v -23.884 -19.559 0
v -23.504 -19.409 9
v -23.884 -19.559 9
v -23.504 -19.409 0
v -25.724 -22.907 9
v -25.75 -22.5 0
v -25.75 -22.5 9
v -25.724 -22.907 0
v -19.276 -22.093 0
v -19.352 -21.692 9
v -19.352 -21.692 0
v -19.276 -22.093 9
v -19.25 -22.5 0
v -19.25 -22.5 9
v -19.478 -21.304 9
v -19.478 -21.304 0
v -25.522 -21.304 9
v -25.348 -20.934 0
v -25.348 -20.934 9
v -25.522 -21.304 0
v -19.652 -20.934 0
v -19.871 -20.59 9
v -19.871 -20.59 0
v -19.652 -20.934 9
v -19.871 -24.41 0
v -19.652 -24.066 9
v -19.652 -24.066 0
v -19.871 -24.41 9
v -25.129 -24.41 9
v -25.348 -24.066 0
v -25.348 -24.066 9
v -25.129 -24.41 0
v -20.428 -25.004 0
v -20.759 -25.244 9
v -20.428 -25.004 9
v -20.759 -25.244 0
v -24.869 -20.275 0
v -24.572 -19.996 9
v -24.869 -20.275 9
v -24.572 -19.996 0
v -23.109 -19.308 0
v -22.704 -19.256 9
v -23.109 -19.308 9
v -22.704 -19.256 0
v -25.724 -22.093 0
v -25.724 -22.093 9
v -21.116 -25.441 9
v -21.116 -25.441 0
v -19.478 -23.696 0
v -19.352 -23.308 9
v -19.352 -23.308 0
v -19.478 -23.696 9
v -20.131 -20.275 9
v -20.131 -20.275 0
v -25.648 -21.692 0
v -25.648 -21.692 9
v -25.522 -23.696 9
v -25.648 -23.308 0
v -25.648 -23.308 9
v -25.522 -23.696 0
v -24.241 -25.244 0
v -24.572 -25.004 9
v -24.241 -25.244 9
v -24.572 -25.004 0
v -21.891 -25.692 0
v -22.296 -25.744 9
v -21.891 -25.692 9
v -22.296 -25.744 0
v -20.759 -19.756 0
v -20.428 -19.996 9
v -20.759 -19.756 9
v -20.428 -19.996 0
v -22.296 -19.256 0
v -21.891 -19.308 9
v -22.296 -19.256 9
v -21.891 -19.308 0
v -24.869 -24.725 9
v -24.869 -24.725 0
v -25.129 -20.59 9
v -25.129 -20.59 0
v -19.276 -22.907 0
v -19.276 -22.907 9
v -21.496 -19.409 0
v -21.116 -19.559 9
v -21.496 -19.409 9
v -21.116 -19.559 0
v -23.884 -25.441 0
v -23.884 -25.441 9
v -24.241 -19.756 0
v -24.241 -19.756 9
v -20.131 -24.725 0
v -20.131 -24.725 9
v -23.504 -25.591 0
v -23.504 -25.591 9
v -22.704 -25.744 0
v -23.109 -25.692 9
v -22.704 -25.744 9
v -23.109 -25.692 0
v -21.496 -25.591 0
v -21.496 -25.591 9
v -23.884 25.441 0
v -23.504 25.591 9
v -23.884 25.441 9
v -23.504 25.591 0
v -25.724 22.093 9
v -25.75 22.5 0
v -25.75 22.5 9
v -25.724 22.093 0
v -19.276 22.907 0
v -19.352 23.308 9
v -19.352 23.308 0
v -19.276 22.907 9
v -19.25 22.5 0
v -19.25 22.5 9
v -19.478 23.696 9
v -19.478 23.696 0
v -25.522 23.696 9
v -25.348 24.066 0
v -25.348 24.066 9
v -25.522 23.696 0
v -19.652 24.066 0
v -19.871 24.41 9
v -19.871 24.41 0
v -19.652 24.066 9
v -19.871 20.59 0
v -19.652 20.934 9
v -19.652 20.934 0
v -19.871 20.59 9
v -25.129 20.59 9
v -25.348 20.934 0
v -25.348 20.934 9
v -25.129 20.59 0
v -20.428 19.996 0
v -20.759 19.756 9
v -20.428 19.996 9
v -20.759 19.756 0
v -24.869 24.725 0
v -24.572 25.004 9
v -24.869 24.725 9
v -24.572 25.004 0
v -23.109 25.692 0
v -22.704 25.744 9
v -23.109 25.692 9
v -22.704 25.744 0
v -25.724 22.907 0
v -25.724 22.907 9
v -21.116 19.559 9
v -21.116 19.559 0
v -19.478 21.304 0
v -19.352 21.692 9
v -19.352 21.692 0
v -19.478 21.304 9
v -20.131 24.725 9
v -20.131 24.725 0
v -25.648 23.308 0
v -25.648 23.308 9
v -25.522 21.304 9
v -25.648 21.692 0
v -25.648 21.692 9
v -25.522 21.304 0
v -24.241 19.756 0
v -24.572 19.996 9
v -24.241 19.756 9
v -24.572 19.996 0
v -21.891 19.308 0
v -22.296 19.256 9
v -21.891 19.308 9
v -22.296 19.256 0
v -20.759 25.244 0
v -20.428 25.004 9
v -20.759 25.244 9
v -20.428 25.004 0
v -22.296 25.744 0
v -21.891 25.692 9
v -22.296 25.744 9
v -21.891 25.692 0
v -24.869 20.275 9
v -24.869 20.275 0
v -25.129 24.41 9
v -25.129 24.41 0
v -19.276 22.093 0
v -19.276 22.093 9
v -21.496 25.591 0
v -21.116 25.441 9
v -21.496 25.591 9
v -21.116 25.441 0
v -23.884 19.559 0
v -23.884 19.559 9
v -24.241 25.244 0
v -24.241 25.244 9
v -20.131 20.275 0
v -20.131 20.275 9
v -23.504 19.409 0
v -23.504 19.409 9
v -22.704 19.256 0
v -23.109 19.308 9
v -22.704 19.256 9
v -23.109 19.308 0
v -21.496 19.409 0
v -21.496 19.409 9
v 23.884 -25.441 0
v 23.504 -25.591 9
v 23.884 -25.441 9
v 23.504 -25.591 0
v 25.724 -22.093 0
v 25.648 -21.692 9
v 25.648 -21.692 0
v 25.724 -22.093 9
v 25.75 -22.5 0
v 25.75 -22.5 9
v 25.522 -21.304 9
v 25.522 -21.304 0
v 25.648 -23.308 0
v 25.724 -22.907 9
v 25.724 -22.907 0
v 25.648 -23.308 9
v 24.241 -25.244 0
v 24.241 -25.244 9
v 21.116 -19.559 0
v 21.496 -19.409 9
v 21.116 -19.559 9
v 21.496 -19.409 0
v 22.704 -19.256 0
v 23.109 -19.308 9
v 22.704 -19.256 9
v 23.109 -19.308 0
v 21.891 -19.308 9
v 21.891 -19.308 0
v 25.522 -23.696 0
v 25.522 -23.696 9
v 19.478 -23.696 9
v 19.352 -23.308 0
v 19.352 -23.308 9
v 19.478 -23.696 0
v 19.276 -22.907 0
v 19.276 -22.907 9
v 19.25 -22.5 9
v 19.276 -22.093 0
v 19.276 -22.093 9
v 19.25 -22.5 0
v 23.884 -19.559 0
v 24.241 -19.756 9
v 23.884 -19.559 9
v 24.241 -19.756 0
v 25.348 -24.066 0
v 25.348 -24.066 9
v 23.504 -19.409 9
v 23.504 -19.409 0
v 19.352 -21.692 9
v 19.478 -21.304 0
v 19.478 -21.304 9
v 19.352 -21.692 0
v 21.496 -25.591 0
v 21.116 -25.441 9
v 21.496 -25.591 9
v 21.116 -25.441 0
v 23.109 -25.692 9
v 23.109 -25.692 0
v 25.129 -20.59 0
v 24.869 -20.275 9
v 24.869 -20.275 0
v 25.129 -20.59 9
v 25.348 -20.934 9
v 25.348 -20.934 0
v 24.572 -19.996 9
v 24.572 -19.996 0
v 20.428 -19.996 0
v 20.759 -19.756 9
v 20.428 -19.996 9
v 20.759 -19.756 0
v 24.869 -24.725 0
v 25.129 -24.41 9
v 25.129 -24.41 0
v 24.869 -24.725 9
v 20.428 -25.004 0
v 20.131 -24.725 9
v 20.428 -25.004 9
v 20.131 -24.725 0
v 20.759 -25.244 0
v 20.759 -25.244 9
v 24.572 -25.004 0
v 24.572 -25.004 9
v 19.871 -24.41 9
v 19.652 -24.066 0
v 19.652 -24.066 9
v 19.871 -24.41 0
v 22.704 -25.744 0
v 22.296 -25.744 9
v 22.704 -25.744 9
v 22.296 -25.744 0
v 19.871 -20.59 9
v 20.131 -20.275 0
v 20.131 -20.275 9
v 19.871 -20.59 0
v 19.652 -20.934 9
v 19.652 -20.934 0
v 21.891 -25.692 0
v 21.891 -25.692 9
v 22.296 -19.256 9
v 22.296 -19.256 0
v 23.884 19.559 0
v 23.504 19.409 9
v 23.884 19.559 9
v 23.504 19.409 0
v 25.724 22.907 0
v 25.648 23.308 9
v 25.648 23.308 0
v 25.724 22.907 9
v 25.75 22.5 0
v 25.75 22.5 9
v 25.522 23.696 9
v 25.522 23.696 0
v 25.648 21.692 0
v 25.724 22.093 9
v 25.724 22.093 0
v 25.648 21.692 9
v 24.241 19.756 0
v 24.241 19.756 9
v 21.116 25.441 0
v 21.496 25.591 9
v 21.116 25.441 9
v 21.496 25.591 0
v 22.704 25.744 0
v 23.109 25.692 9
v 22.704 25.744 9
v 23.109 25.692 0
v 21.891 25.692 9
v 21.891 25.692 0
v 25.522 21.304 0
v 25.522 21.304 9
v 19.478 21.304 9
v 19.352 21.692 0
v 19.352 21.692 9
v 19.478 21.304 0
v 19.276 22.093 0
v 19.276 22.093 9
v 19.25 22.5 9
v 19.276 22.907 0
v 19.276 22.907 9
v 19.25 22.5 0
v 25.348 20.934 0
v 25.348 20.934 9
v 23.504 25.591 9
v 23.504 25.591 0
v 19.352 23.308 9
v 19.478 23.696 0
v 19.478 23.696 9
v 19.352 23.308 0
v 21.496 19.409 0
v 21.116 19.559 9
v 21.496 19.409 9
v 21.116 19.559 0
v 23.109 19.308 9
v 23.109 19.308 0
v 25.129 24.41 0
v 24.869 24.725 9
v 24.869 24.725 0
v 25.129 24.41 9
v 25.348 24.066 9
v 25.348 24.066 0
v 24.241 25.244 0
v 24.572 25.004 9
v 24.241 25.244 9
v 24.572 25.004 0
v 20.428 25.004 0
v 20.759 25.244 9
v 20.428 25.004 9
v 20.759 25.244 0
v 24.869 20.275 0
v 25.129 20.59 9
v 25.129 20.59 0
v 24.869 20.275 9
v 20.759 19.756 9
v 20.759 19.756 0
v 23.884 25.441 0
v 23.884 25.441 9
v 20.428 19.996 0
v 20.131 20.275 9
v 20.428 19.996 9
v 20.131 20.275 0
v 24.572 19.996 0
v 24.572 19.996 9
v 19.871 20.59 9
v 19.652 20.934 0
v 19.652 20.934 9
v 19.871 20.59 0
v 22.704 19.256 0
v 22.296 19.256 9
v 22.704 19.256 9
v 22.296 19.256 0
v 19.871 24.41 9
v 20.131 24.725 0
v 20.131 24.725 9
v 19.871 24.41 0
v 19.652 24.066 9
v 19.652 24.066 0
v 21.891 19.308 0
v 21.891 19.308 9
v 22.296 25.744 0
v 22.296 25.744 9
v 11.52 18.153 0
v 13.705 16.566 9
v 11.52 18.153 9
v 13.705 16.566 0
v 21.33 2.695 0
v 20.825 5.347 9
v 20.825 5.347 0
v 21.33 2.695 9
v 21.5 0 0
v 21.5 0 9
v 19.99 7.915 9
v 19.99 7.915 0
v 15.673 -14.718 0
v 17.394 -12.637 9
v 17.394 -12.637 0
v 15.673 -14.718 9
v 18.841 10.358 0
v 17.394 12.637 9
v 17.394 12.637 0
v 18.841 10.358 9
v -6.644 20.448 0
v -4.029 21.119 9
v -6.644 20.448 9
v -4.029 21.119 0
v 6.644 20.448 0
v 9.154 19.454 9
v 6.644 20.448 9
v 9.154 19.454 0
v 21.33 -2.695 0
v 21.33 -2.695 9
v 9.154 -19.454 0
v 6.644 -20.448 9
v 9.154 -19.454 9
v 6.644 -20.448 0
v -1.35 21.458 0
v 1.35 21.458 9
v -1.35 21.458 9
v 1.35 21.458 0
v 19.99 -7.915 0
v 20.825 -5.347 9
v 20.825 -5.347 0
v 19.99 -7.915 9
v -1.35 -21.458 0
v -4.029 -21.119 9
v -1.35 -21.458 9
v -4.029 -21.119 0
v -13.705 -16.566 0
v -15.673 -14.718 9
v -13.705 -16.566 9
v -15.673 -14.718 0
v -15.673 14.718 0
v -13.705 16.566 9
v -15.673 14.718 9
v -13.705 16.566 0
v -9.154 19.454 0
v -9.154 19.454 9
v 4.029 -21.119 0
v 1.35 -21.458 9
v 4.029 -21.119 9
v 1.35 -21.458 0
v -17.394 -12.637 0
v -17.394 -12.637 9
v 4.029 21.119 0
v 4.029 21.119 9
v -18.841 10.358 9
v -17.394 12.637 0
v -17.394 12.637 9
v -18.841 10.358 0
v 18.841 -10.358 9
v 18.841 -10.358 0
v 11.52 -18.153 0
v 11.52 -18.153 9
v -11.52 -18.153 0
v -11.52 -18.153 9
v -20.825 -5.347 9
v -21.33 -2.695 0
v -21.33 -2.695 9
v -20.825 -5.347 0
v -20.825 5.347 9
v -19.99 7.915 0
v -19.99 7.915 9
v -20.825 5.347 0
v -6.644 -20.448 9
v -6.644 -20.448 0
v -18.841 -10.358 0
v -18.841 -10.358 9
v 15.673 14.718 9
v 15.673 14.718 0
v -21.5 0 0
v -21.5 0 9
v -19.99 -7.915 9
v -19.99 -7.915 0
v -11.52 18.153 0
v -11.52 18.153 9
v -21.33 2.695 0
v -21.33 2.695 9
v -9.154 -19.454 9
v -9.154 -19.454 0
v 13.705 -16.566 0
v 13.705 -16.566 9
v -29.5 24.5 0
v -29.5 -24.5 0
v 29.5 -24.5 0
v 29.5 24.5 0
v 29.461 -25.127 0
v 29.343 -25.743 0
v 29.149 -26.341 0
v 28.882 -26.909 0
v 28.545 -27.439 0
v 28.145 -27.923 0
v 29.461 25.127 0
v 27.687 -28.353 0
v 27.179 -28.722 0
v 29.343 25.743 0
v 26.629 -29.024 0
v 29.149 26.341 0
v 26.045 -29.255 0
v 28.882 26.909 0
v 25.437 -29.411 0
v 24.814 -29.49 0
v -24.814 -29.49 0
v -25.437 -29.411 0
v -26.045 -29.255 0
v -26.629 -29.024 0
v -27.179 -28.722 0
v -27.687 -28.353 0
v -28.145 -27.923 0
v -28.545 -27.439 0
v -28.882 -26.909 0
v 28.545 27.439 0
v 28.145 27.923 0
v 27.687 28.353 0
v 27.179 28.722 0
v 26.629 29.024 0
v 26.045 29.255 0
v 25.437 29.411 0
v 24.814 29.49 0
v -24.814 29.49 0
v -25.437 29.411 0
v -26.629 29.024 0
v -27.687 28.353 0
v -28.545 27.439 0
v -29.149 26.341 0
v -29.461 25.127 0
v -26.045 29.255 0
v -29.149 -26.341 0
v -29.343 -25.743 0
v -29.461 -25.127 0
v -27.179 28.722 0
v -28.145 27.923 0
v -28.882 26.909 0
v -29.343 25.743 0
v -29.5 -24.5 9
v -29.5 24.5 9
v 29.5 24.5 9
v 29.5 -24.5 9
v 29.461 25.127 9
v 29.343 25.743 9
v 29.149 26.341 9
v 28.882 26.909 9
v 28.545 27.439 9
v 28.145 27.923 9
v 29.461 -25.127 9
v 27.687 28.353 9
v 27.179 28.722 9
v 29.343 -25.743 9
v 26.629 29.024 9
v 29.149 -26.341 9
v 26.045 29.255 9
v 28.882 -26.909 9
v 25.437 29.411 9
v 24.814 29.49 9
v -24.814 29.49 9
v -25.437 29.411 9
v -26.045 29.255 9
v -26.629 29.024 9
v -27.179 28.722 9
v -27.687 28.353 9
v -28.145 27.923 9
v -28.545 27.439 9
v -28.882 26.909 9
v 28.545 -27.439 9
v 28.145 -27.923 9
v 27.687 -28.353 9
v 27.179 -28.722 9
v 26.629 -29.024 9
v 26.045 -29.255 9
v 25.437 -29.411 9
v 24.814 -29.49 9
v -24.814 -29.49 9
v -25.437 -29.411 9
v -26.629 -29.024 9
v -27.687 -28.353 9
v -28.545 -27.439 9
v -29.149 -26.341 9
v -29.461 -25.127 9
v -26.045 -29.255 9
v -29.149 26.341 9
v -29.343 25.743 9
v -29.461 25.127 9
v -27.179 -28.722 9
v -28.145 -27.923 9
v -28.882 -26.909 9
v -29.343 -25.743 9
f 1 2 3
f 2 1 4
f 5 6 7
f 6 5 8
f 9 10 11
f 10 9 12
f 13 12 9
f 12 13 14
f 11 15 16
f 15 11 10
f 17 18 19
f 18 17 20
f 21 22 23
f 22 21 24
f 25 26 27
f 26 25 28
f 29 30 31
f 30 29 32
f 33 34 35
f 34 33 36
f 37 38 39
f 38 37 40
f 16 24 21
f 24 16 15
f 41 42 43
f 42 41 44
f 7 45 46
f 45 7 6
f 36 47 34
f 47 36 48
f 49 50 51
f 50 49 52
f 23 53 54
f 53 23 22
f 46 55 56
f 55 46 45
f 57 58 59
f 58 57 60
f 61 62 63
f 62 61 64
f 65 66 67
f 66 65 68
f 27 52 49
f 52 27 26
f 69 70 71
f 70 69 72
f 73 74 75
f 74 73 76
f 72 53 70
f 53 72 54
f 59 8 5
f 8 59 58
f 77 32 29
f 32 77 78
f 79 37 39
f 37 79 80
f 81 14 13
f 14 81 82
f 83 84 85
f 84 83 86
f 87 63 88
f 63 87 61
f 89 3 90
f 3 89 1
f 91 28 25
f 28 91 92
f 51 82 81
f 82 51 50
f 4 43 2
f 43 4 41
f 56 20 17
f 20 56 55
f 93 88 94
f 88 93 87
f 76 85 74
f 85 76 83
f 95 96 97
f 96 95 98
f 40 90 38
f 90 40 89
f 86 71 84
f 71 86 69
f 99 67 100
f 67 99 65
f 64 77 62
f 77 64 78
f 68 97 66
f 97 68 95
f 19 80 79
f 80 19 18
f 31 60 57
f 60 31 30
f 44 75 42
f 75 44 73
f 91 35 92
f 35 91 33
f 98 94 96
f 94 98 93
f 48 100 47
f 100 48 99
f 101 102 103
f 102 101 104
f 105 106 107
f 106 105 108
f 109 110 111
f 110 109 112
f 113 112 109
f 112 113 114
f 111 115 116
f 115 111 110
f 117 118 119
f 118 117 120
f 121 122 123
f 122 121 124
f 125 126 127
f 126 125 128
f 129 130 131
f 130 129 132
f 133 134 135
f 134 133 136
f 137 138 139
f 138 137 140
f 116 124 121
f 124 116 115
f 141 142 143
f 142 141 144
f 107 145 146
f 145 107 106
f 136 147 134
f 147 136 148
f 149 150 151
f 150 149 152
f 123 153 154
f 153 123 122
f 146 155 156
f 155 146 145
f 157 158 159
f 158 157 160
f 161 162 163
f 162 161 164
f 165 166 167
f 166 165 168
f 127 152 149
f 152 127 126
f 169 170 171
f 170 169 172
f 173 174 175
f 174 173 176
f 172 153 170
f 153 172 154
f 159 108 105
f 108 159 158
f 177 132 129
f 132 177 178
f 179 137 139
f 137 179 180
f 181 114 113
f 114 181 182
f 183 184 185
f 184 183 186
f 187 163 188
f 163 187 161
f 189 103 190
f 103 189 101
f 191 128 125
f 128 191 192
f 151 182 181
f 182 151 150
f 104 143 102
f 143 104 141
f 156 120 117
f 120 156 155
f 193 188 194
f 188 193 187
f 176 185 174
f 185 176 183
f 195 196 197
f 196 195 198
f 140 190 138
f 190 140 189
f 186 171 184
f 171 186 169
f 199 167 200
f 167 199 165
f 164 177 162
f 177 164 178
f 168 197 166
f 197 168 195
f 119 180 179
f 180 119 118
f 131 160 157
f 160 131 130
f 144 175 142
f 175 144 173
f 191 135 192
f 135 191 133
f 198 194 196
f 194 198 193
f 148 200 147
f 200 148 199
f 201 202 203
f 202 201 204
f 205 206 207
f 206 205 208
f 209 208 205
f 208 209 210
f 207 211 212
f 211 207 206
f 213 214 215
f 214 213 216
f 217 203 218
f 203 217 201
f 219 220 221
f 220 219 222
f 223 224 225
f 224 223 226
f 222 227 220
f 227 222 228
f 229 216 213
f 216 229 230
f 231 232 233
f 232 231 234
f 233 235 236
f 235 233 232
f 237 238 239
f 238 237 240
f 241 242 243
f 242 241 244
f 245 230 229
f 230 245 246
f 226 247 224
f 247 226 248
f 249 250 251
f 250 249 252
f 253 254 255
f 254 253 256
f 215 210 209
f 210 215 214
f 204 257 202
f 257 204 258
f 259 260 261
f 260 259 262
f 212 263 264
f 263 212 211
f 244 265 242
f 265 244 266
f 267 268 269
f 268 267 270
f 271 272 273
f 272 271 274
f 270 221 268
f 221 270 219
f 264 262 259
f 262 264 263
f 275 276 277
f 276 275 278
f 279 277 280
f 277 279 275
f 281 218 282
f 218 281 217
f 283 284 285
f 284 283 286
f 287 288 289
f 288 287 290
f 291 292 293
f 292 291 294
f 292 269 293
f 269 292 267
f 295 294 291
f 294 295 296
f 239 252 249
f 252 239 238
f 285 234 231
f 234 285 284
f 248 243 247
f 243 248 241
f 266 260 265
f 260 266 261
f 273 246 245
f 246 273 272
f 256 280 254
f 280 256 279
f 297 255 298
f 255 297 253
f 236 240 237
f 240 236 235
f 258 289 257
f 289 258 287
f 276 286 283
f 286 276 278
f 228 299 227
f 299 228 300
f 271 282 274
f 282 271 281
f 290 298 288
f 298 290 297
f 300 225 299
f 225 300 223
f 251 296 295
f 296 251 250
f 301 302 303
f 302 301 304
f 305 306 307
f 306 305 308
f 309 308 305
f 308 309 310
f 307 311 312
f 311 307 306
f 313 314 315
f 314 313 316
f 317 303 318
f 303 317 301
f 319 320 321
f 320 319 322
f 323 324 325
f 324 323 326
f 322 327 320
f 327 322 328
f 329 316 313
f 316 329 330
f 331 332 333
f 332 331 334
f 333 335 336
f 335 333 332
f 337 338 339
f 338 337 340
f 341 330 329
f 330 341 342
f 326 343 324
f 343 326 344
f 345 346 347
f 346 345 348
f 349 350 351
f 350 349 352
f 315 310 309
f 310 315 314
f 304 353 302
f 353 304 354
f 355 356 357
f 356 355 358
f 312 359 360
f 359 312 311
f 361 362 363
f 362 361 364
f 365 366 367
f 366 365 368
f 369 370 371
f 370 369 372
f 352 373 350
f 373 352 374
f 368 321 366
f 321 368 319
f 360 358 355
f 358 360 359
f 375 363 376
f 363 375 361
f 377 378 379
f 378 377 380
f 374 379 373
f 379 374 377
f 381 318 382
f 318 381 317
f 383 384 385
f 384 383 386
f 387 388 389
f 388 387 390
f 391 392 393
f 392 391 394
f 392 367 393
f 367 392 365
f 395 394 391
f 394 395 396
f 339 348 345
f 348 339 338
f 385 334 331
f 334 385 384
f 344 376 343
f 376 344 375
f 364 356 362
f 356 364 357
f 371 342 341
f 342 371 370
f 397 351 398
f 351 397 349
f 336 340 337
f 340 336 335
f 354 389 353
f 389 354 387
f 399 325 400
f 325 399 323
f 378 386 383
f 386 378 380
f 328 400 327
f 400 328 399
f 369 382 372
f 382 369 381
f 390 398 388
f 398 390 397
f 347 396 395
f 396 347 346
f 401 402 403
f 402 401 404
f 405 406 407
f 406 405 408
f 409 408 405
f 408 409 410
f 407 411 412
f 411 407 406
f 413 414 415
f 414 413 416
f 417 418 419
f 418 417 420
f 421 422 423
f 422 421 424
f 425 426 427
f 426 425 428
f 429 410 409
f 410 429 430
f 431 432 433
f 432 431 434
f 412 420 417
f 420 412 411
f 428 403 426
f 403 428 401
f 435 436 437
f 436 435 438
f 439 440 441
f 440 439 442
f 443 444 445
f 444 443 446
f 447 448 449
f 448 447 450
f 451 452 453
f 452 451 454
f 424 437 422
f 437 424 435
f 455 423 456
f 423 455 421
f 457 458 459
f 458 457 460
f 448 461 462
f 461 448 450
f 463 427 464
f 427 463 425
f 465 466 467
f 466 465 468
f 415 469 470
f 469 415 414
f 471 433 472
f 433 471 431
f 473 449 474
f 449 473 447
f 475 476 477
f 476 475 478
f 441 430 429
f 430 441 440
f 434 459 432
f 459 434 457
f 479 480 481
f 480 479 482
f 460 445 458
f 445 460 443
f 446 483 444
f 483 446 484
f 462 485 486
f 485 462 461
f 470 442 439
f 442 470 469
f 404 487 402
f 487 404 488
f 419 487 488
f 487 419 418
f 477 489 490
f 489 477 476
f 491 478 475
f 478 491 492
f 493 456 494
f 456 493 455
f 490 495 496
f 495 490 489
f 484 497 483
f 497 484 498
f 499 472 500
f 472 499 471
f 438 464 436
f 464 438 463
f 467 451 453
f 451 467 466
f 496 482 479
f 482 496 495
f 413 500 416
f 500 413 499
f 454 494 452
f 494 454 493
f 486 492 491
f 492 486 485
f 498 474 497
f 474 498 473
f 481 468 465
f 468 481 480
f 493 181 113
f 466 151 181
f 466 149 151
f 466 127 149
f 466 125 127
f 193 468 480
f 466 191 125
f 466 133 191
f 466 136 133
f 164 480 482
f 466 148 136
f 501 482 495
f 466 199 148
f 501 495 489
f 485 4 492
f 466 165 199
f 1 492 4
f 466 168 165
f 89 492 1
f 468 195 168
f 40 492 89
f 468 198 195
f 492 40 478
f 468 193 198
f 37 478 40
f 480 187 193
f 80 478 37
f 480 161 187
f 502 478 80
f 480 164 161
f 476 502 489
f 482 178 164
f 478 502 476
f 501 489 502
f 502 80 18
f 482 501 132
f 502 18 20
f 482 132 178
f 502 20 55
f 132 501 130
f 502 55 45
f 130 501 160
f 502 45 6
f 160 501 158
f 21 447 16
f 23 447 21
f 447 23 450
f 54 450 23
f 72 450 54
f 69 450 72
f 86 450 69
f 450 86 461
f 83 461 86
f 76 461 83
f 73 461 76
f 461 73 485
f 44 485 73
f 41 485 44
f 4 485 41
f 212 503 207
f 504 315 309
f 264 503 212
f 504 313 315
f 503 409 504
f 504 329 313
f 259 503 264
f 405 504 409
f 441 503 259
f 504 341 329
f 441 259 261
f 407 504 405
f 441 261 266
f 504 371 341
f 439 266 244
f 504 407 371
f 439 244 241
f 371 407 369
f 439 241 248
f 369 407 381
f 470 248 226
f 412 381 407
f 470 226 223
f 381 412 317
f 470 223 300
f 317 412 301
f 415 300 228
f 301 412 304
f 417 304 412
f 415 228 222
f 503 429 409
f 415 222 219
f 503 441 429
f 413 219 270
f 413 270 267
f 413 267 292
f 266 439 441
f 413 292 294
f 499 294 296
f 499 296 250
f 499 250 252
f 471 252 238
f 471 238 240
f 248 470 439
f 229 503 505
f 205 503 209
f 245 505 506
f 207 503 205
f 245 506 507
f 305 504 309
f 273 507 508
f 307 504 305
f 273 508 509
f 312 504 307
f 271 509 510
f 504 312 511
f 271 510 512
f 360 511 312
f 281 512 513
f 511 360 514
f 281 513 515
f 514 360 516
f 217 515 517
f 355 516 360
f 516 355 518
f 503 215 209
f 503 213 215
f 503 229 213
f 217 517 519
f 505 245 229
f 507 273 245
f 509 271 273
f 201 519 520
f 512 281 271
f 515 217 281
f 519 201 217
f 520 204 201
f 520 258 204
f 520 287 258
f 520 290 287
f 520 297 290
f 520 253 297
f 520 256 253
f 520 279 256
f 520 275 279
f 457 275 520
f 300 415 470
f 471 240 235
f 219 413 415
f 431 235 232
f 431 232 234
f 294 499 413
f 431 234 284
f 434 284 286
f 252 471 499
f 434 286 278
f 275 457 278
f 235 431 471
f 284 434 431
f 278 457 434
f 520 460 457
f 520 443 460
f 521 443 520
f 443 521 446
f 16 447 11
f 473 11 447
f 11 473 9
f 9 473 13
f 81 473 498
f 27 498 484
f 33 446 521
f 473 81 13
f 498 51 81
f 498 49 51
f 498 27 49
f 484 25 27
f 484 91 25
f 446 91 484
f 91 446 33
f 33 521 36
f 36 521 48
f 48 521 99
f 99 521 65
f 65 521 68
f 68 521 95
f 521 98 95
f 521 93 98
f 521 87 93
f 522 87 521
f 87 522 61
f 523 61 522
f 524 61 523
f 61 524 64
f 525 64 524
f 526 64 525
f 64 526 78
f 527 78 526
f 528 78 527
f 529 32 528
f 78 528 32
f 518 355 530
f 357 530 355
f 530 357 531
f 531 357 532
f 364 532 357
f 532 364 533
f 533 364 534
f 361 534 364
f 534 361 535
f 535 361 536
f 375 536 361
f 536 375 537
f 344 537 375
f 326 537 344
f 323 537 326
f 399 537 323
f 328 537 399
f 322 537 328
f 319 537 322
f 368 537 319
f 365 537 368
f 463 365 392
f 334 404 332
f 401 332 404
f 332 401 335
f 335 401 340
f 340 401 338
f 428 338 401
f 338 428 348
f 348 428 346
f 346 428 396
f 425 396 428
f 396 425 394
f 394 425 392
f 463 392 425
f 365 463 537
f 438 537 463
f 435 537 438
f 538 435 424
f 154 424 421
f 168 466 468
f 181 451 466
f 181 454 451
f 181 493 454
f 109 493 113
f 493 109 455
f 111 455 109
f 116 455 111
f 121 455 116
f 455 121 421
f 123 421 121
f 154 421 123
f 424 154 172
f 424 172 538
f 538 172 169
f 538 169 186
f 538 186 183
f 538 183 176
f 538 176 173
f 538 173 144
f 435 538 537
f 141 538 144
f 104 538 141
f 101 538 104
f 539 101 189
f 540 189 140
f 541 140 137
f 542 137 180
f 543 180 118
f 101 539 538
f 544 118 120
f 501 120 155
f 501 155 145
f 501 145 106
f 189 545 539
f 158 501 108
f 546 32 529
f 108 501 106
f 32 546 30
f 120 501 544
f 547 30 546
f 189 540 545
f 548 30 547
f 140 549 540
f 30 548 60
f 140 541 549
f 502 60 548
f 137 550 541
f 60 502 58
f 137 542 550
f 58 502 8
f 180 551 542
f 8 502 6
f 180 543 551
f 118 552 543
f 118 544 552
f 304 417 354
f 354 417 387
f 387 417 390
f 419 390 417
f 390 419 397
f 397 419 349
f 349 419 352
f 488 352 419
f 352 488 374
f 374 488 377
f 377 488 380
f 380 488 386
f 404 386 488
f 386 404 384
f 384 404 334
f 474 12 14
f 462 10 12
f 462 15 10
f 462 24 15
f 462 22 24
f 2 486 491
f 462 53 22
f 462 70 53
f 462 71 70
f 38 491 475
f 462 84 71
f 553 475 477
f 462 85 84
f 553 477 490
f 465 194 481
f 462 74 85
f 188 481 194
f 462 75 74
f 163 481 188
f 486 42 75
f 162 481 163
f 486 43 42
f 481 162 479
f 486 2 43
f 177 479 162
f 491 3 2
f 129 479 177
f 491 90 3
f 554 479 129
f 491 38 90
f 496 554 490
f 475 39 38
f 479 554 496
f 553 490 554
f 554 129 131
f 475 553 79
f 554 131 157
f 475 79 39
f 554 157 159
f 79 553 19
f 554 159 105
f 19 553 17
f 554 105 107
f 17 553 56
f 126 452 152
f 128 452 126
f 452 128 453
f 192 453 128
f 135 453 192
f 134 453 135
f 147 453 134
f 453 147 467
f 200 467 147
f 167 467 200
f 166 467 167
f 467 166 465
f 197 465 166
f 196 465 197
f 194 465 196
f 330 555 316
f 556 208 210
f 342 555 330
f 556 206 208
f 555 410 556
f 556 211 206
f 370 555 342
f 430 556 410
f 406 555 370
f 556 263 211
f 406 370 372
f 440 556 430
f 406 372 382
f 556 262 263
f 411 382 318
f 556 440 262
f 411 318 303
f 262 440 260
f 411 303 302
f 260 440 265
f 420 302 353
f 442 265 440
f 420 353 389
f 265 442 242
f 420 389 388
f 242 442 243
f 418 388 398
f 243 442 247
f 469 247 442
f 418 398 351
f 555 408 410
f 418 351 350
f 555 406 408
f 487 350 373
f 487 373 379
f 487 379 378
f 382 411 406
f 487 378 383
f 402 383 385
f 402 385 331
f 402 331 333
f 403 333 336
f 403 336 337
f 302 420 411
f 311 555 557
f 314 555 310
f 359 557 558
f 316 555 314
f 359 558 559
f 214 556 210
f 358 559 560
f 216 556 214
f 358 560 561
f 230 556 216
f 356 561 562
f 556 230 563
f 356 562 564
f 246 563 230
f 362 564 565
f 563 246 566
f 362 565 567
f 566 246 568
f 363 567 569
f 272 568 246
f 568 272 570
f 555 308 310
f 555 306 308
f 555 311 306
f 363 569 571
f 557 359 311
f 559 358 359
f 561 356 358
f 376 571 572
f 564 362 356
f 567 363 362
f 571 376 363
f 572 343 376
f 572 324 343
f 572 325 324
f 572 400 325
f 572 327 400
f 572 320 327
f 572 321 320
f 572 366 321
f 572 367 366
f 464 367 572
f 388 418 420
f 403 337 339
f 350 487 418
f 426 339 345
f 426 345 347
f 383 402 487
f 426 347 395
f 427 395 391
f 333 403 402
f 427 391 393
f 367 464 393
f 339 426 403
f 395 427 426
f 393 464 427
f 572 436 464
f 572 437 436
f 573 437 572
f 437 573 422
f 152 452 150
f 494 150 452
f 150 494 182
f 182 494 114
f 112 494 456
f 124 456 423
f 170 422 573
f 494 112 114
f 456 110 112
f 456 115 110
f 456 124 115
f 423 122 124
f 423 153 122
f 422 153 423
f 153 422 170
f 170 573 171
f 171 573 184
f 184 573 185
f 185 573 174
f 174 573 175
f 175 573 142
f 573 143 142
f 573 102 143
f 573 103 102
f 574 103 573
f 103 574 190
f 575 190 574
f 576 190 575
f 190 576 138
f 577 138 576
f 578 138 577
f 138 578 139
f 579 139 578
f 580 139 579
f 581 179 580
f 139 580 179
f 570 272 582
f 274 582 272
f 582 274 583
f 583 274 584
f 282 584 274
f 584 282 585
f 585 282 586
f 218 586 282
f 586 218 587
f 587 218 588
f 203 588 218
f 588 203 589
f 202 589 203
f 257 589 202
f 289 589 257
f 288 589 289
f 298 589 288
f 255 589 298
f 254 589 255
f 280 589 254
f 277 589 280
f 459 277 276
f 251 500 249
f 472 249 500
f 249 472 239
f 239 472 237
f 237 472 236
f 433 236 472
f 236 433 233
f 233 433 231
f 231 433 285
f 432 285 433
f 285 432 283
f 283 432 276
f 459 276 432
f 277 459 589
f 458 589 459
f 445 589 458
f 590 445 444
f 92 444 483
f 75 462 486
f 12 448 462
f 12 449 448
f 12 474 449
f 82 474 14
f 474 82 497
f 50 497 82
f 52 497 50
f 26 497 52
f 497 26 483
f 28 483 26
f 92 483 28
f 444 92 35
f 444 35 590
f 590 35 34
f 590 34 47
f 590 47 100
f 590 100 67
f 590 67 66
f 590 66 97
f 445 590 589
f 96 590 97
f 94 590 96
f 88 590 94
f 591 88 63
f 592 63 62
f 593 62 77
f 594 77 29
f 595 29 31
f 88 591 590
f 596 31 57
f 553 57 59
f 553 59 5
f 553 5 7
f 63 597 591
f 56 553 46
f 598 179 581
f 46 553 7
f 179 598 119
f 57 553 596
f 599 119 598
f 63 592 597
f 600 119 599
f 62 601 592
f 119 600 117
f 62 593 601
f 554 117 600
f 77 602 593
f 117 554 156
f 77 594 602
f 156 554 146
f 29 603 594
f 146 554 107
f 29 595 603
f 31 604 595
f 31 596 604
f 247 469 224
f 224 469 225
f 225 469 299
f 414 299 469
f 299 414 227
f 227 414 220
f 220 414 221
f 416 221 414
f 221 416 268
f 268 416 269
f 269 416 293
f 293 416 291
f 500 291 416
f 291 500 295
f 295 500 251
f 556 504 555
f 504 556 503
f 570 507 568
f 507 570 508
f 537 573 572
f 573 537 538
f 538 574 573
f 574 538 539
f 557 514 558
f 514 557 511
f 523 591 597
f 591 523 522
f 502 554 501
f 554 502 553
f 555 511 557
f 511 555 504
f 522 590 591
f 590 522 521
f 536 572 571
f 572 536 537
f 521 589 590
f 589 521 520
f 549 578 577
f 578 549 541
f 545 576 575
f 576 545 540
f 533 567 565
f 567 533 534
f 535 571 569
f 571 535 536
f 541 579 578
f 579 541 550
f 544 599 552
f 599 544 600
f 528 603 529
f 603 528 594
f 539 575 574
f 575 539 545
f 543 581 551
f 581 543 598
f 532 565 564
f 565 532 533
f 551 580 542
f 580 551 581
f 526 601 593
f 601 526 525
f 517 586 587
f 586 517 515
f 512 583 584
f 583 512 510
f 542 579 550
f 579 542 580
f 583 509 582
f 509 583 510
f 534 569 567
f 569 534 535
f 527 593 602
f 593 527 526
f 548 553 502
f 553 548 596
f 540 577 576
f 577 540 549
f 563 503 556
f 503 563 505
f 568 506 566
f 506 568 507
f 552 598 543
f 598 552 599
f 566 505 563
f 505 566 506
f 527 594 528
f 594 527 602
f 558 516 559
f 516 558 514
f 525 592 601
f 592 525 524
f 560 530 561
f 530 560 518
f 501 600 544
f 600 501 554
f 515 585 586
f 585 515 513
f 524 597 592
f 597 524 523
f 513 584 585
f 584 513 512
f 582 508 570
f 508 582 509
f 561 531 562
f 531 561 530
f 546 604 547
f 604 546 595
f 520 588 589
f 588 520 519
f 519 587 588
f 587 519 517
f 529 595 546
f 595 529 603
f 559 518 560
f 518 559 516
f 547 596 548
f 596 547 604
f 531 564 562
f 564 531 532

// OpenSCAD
$fn = 50;

difference() {
	union() {
		hull() {
			translate(v = [-24.5, 24.5, 0]) {
				cylinder(h = 9, r = 5);
			}
			translate(v = [24.5, 24.5, 0]) {
				cylinder(h = 9, r = 5);
			}
			translate(v = [-24.5, -24.5, 0]) {
				cylinder(h = 9, r = 5);
			}
			translate(v = [24.5, -24.5, 0]) {
				cylinder(h = 9, r = 5);
			}
		}
	}
	union() {
		translate(v = [-22.5, -22.5, -100.0]) {
			cylinder(h = 200, r = 3.25);
		}
		translate(v = [-22.5, 22.5, -100.0]) {
			cylinder(h = 200, r = 3.25);
		}
		translate(v = [22.5, -22.5, -100.0]) {
			cylinder(h = 200, r = 3.25);
		}
		translate(v = [22.5, 22.5, -100.0]) {
			cylinder(h = 200, r = 3.25);
		}
		translate(v = [-22.5, -22.5, -100.0]) {
			cylinder(h = 200, r = 1.8);
		}
		translate(v = [-22.5, 22.5, -100.0]) {
			cylinder(h = 200, r = 1.8);
		}
		translate(v = [22.5, -22.5, -100.0]) {
			cylinder(h = 200, r = 1.8);
		}
		translate(v = [22.5, 22.5, -100.0]) {
			cylinder(h = 200, r = 1.8);
		}
		cylinder(h = 9, r = 21.5);
	}
}
